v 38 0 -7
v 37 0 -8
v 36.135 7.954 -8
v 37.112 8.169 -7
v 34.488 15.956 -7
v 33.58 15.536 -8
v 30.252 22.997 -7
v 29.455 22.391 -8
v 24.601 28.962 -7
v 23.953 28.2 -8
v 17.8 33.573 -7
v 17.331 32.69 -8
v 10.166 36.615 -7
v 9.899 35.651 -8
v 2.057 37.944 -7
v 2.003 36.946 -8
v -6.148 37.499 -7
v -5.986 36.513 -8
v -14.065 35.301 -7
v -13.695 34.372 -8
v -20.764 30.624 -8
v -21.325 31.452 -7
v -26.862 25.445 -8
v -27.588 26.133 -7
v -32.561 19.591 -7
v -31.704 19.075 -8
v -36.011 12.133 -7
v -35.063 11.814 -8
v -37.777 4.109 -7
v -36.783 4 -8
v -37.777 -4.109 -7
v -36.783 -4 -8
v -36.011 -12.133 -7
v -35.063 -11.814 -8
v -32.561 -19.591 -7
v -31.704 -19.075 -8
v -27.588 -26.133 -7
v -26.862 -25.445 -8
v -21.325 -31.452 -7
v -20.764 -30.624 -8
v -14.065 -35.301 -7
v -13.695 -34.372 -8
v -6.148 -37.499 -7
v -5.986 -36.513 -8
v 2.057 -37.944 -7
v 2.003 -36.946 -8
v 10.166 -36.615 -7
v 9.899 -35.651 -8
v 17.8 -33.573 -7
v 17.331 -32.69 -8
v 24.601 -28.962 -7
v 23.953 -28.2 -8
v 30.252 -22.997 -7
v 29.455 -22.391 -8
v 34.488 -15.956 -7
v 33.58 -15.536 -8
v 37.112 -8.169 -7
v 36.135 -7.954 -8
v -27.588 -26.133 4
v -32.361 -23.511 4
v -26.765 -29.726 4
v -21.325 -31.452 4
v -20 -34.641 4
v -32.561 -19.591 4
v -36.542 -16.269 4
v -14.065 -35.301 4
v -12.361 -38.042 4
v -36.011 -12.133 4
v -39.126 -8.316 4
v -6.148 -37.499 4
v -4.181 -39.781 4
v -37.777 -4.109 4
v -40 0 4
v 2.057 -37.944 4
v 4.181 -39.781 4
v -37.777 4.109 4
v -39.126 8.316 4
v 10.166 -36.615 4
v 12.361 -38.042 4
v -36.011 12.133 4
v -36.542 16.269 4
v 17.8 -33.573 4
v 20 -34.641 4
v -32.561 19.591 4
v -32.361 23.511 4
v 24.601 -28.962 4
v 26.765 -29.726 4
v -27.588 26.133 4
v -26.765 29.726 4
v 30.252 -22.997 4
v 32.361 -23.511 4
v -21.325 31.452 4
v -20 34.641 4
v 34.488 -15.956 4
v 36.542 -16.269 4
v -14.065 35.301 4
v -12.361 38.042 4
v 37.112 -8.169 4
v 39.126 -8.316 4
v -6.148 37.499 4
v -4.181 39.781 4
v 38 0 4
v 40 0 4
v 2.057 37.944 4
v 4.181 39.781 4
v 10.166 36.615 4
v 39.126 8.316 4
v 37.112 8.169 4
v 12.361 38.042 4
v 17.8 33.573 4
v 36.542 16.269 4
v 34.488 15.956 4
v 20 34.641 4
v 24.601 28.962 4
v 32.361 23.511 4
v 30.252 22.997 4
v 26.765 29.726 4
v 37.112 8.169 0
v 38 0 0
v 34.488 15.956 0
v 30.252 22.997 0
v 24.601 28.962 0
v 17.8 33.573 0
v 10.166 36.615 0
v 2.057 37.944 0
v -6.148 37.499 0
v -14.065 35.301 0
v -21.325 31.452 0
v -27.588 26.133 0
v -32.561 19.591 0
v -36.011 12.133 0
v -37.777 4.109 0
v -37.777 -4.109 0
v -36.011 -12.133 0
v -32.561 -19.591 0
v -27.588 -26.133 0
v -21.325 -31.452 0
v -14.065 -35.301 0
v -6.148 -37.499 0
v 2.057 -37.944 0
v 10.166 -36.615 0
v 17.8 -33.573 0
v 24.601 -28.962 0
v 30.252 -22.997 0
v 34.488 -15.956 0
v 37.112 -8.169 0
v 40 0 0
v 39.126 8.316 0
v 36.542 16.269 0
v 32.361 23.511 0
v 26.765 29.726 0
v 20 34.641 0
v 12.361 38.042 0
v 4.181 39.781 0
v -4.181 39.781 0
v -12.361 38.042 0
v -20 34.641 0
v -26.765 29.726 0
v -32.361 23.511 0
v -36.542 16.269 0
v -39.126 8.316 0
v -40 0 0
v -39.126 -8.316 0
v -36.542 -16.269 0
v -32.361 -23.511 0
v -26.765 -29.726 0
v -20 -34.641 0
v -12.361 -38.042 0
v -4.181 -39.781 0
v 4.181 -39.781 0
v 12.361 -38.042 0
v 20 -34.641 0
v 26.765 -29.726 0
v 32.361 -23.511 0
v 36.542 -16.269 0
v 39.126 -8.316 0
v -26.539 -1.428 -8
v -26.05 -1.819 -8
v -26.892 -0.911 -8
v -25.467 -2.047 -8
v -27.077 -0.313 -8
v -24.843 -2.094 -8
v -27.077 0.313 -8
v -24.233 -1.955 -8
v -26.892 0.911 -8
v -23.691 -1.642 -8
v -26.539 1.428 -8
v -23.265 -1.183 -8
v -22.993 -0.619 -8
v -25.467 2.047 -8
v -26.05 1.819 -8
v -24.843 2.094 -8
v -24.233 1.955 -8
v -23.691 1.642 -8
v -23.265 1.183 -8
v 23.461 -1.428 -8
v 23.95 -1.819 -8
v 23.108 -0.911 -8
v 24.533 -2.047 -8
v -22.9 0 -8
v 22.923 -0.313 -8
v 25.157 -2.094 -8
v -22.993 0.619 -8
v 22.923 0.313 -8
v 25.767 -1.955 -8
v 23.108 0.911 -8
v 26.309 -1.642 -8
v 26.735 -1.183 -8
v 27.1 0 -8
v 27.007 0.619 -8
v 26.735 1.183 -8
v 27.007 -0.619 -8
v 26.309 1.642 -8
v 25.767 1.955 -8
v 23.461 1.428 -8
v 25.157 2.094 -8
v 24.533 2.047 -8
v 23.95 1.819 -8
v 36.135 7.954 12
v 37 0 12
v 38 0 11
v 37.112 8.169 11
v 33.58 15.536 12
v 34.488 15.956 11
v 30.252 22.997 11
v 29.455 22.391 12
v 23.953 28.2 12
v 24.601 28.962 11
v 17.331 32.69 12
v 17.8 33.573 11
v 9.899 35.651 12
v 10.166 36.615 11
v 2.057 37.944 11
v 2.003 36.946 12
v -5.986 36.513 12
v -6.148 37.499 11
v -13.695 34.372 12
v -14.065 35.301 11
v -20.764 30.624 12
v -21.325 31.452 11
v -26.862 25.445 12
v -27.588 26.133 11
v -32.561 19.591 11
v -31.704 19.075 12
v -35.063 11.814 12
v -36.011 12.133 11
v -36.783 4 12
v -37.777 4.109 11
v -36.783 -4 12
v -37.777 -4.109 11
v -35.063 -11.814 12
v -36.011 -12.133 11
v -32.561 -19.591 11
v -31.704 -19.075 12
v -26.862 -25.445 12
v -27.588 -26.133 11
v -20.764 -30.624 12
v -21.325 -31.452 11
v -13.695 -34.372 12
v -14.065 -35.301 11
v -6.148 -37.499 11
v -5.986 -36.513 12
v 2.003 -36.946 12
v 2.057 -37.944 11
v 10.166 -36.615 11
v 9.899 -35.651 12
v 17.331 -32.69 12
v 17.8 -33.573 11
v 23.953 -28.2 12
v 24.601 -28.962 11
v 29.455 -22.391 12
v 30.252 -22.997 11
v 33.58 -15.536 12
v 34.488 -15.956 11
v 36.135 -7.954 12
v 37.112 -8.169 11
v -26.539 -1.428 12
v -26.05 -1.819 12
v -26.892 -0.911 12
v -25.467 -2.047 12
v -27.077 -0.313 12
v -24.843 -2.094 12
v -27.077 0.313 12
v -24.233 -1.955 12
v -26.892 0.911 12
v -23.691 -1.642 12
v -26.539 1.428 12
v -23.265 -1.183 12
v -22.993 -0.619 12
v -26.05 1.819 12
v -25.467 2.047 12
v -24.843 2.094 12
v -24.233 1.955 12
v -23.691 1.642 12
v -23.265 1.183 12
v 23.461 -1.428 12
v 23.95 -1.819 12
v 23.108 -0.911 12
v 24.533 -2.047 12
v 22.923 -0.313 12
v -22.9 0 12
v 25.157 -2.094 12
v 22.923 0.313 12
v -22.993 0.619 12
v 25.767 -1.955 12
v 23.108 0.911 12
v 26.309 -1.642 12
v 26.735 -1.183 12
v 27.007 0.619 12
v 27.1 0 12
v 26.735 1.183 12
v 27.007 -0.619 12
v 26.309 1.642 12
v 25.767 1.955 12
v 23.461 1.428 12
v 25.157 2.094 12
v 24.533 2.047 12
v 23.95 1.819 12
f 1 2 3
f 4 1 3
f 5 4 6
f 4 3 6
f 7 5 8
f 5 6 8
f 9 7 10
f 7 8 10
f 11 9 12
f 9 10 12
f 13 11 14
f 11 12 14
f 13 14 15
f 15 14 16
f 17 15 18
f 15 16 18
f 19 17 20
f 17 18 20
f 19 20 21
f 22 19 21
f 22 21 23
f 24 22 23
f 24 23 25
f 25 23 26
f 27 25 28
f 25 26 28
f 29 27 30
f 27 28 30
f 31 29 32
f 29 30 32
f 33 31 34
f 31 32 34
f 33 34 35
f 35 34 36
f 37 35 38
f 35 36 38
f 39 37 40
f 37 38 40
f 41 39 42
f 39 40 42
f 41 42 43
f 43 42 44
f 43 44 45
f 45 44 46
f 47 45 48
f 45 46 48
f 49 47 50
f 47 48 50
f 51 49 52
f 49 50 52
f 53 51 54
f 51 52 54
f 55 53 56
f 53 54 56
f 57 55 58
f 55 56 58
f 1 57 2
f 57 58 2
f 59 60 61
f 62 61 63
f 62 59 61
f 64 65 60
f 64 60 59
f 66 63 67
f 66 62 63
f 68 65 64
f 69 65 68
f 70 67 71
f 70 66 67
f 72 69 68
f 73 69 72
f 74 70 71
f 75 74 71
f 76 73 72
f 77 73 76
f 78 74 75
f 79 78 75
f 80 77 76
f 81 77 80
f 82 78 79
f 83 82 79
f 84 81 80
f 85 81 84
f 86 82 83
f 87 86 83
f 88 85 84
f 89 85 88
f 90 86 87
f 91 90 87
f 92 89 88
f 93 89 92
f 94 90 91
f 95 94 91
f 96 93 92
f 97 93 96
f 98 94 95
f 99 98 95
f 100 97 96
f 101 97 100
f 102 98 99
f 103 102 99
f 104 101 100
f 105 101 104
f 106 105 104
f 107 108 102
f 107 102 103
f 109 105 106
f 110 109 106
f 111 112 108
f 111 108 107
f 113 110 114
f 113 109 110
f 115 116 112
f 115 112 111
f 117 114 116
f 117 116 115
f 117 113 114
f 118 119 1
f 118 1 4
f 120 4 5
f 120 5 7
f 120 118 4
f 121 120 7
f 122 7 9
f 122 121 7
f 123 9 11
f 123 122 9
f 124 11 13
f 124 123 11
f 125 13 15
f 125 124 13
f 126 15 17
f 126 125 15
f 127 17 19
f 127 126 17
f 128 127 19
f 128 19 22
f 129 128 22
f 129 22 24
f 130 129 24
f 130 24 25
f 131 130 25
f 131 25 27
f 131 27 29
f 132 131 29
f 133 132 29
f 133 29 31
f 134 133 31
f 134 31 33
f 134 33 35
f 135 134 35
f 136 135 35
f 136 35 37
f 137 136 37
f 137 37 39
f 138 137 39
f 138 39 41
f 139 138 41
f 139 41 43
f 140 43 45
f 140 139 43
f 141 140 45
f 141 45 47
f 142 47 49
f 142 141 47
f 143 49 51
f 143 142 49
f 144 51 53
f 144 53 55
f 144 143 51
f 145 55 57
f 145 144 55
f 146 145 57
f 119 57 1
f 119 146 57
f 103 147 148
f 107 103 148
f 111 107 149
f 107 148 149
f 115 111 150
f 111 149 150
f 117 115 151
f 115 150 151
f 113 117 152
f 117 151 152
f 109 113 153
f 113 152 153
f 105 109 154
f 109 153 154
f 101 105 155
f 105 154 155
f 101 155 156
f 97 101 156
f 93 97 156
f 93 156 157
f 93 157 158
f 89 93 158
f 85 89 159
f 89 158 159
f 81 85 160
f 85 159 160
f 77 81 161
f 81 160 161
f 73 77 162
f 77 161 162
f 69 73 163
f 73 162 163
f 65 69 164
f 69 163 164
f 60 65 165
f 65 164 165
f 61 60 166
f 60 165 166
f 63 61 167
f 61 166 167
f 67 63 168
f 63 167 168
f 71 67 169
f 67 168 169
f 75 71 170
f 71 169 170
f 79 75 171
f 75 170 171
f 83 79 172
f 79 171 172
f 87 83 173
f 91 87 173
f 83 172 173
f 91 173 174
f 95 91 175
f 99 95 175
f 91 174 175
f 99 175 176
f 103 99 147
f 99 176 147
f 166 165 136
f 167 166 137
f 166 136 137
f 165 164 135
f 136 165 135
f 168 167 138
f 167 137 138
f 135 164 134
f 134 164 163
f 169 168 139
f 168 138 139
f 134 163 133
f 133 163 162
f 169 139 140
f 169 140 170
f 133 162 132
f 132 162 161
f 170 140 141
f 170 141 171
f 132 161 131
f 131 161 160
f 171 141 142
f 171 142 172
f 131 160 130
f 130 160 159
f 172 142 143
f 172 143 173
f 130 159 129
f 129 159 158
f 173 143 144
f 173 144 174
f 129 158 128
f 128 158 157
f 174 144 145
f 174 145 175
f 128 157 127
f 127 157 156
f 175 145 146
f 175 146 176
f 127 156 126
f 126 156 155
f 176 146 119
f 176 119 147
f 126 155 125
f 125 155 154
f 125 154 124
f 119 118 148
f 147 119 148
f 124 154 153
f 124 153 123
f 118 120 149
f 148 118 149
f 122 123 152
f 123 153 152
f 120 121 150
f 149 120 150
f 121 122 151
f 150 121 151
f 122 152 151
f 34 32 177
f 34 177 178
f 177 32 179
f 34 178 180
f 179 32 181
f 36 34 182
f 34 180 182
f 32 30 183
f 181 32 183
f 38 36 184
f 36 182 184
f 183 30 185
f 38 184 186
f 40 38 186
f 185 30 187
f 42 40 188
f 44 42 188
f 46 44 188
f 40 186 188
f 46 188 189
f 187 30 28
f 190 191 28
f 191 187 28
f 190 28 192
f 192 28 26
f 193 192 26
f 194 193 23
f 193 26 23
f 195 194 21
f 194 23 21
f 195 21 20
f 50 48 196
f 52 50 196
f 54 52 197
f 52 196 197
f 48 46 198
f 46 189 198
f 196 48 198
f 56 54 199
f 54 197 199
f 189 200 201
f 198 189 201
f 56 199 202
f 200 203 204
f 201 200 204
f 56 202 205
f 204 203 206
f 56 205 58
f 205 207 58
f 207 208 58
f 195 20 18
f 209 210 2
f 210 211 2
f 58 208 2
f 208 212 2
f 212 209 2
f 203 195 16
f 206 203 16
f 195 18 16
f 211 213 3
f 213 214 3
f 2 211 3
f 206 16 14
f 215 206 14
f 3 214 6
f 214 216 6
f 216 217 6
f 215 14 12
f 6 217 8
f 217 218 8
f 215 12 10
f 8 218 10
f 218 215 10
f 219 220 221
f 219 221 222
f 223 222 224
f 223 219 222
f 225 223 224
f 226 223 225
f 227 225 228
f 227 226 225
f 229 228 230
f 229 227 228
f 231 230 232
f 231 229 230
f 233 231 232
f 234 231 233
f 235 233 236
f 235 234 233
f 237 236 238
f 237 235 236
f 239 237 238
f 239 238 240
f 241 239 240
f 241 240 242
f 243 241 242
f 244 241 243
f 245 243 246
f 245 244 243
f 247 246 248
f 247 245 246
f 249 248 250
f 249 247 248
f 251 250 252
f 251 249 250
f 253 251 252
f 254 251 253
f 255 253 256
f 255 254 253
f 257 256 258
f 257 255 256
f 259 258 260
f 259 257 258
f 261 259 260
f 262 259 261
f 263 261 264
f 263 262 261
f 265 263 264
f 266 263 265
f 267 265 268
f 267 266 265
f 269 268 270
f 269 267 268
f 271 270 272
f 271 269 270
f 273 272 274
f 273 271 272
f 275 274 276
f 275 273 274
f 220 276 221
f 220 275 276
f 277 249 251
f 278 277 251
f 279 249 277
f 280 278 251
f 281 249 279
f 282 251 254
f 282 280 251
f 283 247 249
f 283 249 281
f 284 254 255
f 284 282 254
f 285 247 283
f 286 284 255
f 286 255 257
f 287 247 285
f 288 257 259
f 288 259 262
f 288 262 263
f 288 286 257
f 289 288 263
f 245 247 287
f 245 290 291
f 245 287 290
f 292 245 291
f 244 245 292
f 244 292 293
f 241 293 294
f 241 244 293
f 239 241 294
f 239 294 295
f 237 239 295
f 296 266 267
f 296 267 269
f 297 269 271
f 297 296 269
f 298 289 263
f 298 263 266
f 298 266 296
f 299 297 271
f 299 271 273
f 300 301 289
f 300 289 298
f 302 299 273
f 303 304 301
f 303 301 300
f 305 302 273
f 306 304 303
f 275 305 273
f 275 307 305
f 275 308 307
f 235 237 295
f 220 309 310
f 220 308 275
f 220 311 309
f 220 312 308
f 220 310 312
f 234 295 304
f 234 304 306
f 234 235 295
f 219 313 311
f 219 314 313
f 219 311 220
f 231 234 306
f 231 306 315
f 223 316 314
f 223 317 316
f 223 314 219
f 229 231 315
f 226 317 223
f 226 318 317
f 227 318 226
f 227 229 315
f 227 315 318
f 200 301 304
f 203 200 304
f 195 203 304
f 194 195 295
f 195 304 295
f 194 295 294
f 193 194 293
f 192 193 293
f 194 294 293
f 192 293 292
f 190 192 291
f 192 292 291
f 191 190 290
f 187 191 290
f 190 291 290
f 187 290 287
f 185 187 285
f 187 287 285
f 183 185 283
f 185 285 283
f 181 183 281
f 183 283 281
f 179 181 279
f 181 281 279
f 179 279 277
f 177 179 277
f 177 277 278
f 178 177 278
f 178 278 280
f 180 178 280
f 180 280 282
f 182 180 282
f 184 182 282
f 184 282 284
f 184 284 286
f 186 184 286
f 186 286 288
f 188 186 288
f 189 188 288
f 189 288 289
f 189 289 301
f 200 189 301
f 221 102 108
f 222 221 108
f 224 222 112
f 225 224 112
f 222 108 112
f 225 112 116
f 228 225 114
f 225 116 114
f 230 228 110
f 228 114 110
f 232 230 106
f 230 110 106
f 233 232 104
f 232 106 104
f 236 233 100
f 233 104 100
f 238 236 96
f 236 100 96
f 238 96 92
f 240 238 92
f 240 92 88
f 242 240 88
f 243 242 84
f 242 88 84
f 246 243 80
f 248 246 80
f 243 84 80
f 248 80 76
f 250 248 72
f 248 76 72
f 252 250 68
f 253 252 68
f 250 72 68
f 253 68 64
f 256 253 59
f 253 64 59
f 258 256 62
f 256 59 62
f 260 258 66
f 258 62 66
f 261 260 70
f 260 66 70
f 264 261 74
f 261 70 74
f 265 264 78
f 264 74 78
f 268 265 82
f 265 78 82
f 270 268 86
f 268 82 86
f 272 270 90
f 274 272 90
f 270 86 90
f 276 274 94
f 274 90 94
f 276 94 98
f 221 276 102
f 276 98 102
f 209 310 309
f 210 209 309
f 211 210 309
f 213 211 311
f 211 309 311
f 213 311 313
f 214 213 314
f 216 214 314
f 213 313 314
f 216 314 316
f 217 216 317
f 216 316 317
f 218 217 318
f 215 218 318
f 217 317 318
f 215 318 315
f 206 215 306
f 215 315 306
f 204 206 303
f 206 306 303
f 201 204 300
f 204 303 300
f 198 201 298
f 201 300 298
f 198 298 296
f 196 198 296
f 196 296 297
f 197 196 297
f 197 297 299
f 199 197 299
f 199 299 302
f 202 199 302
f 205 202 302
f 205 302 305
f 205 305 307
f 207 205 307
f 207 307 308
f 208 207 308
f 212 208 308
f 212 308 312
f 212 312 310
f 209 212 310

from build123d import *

# Parameters (mm, degrees)
ESQUISSE1_R             = 40
BOSS_EXTRU_1_DEPTH      = 4
ESQUISSE2_R             = 38
BOSS_EXTRU_2_DEPTH      = 8
BOSS_EXTRU_2_DEPTH_BACK = 12
CHANFREIN1_SIZE         = 1
ESQUISSE3_R             = 2.1
ENL_V_MAT_EXTRU_1_DEPTH = 21


with BuildPart() as part:
    # Esquisse1 → Boss.-Extru.1 (new body)
    with BuildSketch(Plane.XY):
        Circle(ESQUISSE1_R)
    extrude(amount=BOSS_EXTRU_1_DEPTH)

    # Esquisse2 → Boss.-Extru.2 (add, two sides)
    with BuildSketch(Plane.XY.offset(4)) as boss_extru_2_sk:
        Circle(ESQUISSE2_R)
    extrude(amount=BOSS_EXTRU_2_DEPTH)
    extrude(boss_extru_2_sk.sketch, amount=-BOSS_EXTRU_2_DEPTH_BACK)

    # Chanfrein1
    chanfrein1_edges = [part.edges().sort_by_distance(p)[0] for p in [
        (-38, 0, -8),
        (-38, 0, 12),
    ]]
    chamfer(chanfrein1_edges, length=CHANFREIN1_SIZE)

    # Esquisse3 → Enlèv. mat.-Extru.1 (cut, through all)
    with BuildSketch(Plane.XY.offset(12)):
        with Locations((25, 0)):
            Circle(ESQUISSE3_R)
        with Locations((-25, 0)):
            Circle(ESQUISSE3_R)
    extrude(amount=-ENL_V_MAT_EXTRU_1_DEPTH, mode=Mode.SUBTRACT)


solid = part.part
